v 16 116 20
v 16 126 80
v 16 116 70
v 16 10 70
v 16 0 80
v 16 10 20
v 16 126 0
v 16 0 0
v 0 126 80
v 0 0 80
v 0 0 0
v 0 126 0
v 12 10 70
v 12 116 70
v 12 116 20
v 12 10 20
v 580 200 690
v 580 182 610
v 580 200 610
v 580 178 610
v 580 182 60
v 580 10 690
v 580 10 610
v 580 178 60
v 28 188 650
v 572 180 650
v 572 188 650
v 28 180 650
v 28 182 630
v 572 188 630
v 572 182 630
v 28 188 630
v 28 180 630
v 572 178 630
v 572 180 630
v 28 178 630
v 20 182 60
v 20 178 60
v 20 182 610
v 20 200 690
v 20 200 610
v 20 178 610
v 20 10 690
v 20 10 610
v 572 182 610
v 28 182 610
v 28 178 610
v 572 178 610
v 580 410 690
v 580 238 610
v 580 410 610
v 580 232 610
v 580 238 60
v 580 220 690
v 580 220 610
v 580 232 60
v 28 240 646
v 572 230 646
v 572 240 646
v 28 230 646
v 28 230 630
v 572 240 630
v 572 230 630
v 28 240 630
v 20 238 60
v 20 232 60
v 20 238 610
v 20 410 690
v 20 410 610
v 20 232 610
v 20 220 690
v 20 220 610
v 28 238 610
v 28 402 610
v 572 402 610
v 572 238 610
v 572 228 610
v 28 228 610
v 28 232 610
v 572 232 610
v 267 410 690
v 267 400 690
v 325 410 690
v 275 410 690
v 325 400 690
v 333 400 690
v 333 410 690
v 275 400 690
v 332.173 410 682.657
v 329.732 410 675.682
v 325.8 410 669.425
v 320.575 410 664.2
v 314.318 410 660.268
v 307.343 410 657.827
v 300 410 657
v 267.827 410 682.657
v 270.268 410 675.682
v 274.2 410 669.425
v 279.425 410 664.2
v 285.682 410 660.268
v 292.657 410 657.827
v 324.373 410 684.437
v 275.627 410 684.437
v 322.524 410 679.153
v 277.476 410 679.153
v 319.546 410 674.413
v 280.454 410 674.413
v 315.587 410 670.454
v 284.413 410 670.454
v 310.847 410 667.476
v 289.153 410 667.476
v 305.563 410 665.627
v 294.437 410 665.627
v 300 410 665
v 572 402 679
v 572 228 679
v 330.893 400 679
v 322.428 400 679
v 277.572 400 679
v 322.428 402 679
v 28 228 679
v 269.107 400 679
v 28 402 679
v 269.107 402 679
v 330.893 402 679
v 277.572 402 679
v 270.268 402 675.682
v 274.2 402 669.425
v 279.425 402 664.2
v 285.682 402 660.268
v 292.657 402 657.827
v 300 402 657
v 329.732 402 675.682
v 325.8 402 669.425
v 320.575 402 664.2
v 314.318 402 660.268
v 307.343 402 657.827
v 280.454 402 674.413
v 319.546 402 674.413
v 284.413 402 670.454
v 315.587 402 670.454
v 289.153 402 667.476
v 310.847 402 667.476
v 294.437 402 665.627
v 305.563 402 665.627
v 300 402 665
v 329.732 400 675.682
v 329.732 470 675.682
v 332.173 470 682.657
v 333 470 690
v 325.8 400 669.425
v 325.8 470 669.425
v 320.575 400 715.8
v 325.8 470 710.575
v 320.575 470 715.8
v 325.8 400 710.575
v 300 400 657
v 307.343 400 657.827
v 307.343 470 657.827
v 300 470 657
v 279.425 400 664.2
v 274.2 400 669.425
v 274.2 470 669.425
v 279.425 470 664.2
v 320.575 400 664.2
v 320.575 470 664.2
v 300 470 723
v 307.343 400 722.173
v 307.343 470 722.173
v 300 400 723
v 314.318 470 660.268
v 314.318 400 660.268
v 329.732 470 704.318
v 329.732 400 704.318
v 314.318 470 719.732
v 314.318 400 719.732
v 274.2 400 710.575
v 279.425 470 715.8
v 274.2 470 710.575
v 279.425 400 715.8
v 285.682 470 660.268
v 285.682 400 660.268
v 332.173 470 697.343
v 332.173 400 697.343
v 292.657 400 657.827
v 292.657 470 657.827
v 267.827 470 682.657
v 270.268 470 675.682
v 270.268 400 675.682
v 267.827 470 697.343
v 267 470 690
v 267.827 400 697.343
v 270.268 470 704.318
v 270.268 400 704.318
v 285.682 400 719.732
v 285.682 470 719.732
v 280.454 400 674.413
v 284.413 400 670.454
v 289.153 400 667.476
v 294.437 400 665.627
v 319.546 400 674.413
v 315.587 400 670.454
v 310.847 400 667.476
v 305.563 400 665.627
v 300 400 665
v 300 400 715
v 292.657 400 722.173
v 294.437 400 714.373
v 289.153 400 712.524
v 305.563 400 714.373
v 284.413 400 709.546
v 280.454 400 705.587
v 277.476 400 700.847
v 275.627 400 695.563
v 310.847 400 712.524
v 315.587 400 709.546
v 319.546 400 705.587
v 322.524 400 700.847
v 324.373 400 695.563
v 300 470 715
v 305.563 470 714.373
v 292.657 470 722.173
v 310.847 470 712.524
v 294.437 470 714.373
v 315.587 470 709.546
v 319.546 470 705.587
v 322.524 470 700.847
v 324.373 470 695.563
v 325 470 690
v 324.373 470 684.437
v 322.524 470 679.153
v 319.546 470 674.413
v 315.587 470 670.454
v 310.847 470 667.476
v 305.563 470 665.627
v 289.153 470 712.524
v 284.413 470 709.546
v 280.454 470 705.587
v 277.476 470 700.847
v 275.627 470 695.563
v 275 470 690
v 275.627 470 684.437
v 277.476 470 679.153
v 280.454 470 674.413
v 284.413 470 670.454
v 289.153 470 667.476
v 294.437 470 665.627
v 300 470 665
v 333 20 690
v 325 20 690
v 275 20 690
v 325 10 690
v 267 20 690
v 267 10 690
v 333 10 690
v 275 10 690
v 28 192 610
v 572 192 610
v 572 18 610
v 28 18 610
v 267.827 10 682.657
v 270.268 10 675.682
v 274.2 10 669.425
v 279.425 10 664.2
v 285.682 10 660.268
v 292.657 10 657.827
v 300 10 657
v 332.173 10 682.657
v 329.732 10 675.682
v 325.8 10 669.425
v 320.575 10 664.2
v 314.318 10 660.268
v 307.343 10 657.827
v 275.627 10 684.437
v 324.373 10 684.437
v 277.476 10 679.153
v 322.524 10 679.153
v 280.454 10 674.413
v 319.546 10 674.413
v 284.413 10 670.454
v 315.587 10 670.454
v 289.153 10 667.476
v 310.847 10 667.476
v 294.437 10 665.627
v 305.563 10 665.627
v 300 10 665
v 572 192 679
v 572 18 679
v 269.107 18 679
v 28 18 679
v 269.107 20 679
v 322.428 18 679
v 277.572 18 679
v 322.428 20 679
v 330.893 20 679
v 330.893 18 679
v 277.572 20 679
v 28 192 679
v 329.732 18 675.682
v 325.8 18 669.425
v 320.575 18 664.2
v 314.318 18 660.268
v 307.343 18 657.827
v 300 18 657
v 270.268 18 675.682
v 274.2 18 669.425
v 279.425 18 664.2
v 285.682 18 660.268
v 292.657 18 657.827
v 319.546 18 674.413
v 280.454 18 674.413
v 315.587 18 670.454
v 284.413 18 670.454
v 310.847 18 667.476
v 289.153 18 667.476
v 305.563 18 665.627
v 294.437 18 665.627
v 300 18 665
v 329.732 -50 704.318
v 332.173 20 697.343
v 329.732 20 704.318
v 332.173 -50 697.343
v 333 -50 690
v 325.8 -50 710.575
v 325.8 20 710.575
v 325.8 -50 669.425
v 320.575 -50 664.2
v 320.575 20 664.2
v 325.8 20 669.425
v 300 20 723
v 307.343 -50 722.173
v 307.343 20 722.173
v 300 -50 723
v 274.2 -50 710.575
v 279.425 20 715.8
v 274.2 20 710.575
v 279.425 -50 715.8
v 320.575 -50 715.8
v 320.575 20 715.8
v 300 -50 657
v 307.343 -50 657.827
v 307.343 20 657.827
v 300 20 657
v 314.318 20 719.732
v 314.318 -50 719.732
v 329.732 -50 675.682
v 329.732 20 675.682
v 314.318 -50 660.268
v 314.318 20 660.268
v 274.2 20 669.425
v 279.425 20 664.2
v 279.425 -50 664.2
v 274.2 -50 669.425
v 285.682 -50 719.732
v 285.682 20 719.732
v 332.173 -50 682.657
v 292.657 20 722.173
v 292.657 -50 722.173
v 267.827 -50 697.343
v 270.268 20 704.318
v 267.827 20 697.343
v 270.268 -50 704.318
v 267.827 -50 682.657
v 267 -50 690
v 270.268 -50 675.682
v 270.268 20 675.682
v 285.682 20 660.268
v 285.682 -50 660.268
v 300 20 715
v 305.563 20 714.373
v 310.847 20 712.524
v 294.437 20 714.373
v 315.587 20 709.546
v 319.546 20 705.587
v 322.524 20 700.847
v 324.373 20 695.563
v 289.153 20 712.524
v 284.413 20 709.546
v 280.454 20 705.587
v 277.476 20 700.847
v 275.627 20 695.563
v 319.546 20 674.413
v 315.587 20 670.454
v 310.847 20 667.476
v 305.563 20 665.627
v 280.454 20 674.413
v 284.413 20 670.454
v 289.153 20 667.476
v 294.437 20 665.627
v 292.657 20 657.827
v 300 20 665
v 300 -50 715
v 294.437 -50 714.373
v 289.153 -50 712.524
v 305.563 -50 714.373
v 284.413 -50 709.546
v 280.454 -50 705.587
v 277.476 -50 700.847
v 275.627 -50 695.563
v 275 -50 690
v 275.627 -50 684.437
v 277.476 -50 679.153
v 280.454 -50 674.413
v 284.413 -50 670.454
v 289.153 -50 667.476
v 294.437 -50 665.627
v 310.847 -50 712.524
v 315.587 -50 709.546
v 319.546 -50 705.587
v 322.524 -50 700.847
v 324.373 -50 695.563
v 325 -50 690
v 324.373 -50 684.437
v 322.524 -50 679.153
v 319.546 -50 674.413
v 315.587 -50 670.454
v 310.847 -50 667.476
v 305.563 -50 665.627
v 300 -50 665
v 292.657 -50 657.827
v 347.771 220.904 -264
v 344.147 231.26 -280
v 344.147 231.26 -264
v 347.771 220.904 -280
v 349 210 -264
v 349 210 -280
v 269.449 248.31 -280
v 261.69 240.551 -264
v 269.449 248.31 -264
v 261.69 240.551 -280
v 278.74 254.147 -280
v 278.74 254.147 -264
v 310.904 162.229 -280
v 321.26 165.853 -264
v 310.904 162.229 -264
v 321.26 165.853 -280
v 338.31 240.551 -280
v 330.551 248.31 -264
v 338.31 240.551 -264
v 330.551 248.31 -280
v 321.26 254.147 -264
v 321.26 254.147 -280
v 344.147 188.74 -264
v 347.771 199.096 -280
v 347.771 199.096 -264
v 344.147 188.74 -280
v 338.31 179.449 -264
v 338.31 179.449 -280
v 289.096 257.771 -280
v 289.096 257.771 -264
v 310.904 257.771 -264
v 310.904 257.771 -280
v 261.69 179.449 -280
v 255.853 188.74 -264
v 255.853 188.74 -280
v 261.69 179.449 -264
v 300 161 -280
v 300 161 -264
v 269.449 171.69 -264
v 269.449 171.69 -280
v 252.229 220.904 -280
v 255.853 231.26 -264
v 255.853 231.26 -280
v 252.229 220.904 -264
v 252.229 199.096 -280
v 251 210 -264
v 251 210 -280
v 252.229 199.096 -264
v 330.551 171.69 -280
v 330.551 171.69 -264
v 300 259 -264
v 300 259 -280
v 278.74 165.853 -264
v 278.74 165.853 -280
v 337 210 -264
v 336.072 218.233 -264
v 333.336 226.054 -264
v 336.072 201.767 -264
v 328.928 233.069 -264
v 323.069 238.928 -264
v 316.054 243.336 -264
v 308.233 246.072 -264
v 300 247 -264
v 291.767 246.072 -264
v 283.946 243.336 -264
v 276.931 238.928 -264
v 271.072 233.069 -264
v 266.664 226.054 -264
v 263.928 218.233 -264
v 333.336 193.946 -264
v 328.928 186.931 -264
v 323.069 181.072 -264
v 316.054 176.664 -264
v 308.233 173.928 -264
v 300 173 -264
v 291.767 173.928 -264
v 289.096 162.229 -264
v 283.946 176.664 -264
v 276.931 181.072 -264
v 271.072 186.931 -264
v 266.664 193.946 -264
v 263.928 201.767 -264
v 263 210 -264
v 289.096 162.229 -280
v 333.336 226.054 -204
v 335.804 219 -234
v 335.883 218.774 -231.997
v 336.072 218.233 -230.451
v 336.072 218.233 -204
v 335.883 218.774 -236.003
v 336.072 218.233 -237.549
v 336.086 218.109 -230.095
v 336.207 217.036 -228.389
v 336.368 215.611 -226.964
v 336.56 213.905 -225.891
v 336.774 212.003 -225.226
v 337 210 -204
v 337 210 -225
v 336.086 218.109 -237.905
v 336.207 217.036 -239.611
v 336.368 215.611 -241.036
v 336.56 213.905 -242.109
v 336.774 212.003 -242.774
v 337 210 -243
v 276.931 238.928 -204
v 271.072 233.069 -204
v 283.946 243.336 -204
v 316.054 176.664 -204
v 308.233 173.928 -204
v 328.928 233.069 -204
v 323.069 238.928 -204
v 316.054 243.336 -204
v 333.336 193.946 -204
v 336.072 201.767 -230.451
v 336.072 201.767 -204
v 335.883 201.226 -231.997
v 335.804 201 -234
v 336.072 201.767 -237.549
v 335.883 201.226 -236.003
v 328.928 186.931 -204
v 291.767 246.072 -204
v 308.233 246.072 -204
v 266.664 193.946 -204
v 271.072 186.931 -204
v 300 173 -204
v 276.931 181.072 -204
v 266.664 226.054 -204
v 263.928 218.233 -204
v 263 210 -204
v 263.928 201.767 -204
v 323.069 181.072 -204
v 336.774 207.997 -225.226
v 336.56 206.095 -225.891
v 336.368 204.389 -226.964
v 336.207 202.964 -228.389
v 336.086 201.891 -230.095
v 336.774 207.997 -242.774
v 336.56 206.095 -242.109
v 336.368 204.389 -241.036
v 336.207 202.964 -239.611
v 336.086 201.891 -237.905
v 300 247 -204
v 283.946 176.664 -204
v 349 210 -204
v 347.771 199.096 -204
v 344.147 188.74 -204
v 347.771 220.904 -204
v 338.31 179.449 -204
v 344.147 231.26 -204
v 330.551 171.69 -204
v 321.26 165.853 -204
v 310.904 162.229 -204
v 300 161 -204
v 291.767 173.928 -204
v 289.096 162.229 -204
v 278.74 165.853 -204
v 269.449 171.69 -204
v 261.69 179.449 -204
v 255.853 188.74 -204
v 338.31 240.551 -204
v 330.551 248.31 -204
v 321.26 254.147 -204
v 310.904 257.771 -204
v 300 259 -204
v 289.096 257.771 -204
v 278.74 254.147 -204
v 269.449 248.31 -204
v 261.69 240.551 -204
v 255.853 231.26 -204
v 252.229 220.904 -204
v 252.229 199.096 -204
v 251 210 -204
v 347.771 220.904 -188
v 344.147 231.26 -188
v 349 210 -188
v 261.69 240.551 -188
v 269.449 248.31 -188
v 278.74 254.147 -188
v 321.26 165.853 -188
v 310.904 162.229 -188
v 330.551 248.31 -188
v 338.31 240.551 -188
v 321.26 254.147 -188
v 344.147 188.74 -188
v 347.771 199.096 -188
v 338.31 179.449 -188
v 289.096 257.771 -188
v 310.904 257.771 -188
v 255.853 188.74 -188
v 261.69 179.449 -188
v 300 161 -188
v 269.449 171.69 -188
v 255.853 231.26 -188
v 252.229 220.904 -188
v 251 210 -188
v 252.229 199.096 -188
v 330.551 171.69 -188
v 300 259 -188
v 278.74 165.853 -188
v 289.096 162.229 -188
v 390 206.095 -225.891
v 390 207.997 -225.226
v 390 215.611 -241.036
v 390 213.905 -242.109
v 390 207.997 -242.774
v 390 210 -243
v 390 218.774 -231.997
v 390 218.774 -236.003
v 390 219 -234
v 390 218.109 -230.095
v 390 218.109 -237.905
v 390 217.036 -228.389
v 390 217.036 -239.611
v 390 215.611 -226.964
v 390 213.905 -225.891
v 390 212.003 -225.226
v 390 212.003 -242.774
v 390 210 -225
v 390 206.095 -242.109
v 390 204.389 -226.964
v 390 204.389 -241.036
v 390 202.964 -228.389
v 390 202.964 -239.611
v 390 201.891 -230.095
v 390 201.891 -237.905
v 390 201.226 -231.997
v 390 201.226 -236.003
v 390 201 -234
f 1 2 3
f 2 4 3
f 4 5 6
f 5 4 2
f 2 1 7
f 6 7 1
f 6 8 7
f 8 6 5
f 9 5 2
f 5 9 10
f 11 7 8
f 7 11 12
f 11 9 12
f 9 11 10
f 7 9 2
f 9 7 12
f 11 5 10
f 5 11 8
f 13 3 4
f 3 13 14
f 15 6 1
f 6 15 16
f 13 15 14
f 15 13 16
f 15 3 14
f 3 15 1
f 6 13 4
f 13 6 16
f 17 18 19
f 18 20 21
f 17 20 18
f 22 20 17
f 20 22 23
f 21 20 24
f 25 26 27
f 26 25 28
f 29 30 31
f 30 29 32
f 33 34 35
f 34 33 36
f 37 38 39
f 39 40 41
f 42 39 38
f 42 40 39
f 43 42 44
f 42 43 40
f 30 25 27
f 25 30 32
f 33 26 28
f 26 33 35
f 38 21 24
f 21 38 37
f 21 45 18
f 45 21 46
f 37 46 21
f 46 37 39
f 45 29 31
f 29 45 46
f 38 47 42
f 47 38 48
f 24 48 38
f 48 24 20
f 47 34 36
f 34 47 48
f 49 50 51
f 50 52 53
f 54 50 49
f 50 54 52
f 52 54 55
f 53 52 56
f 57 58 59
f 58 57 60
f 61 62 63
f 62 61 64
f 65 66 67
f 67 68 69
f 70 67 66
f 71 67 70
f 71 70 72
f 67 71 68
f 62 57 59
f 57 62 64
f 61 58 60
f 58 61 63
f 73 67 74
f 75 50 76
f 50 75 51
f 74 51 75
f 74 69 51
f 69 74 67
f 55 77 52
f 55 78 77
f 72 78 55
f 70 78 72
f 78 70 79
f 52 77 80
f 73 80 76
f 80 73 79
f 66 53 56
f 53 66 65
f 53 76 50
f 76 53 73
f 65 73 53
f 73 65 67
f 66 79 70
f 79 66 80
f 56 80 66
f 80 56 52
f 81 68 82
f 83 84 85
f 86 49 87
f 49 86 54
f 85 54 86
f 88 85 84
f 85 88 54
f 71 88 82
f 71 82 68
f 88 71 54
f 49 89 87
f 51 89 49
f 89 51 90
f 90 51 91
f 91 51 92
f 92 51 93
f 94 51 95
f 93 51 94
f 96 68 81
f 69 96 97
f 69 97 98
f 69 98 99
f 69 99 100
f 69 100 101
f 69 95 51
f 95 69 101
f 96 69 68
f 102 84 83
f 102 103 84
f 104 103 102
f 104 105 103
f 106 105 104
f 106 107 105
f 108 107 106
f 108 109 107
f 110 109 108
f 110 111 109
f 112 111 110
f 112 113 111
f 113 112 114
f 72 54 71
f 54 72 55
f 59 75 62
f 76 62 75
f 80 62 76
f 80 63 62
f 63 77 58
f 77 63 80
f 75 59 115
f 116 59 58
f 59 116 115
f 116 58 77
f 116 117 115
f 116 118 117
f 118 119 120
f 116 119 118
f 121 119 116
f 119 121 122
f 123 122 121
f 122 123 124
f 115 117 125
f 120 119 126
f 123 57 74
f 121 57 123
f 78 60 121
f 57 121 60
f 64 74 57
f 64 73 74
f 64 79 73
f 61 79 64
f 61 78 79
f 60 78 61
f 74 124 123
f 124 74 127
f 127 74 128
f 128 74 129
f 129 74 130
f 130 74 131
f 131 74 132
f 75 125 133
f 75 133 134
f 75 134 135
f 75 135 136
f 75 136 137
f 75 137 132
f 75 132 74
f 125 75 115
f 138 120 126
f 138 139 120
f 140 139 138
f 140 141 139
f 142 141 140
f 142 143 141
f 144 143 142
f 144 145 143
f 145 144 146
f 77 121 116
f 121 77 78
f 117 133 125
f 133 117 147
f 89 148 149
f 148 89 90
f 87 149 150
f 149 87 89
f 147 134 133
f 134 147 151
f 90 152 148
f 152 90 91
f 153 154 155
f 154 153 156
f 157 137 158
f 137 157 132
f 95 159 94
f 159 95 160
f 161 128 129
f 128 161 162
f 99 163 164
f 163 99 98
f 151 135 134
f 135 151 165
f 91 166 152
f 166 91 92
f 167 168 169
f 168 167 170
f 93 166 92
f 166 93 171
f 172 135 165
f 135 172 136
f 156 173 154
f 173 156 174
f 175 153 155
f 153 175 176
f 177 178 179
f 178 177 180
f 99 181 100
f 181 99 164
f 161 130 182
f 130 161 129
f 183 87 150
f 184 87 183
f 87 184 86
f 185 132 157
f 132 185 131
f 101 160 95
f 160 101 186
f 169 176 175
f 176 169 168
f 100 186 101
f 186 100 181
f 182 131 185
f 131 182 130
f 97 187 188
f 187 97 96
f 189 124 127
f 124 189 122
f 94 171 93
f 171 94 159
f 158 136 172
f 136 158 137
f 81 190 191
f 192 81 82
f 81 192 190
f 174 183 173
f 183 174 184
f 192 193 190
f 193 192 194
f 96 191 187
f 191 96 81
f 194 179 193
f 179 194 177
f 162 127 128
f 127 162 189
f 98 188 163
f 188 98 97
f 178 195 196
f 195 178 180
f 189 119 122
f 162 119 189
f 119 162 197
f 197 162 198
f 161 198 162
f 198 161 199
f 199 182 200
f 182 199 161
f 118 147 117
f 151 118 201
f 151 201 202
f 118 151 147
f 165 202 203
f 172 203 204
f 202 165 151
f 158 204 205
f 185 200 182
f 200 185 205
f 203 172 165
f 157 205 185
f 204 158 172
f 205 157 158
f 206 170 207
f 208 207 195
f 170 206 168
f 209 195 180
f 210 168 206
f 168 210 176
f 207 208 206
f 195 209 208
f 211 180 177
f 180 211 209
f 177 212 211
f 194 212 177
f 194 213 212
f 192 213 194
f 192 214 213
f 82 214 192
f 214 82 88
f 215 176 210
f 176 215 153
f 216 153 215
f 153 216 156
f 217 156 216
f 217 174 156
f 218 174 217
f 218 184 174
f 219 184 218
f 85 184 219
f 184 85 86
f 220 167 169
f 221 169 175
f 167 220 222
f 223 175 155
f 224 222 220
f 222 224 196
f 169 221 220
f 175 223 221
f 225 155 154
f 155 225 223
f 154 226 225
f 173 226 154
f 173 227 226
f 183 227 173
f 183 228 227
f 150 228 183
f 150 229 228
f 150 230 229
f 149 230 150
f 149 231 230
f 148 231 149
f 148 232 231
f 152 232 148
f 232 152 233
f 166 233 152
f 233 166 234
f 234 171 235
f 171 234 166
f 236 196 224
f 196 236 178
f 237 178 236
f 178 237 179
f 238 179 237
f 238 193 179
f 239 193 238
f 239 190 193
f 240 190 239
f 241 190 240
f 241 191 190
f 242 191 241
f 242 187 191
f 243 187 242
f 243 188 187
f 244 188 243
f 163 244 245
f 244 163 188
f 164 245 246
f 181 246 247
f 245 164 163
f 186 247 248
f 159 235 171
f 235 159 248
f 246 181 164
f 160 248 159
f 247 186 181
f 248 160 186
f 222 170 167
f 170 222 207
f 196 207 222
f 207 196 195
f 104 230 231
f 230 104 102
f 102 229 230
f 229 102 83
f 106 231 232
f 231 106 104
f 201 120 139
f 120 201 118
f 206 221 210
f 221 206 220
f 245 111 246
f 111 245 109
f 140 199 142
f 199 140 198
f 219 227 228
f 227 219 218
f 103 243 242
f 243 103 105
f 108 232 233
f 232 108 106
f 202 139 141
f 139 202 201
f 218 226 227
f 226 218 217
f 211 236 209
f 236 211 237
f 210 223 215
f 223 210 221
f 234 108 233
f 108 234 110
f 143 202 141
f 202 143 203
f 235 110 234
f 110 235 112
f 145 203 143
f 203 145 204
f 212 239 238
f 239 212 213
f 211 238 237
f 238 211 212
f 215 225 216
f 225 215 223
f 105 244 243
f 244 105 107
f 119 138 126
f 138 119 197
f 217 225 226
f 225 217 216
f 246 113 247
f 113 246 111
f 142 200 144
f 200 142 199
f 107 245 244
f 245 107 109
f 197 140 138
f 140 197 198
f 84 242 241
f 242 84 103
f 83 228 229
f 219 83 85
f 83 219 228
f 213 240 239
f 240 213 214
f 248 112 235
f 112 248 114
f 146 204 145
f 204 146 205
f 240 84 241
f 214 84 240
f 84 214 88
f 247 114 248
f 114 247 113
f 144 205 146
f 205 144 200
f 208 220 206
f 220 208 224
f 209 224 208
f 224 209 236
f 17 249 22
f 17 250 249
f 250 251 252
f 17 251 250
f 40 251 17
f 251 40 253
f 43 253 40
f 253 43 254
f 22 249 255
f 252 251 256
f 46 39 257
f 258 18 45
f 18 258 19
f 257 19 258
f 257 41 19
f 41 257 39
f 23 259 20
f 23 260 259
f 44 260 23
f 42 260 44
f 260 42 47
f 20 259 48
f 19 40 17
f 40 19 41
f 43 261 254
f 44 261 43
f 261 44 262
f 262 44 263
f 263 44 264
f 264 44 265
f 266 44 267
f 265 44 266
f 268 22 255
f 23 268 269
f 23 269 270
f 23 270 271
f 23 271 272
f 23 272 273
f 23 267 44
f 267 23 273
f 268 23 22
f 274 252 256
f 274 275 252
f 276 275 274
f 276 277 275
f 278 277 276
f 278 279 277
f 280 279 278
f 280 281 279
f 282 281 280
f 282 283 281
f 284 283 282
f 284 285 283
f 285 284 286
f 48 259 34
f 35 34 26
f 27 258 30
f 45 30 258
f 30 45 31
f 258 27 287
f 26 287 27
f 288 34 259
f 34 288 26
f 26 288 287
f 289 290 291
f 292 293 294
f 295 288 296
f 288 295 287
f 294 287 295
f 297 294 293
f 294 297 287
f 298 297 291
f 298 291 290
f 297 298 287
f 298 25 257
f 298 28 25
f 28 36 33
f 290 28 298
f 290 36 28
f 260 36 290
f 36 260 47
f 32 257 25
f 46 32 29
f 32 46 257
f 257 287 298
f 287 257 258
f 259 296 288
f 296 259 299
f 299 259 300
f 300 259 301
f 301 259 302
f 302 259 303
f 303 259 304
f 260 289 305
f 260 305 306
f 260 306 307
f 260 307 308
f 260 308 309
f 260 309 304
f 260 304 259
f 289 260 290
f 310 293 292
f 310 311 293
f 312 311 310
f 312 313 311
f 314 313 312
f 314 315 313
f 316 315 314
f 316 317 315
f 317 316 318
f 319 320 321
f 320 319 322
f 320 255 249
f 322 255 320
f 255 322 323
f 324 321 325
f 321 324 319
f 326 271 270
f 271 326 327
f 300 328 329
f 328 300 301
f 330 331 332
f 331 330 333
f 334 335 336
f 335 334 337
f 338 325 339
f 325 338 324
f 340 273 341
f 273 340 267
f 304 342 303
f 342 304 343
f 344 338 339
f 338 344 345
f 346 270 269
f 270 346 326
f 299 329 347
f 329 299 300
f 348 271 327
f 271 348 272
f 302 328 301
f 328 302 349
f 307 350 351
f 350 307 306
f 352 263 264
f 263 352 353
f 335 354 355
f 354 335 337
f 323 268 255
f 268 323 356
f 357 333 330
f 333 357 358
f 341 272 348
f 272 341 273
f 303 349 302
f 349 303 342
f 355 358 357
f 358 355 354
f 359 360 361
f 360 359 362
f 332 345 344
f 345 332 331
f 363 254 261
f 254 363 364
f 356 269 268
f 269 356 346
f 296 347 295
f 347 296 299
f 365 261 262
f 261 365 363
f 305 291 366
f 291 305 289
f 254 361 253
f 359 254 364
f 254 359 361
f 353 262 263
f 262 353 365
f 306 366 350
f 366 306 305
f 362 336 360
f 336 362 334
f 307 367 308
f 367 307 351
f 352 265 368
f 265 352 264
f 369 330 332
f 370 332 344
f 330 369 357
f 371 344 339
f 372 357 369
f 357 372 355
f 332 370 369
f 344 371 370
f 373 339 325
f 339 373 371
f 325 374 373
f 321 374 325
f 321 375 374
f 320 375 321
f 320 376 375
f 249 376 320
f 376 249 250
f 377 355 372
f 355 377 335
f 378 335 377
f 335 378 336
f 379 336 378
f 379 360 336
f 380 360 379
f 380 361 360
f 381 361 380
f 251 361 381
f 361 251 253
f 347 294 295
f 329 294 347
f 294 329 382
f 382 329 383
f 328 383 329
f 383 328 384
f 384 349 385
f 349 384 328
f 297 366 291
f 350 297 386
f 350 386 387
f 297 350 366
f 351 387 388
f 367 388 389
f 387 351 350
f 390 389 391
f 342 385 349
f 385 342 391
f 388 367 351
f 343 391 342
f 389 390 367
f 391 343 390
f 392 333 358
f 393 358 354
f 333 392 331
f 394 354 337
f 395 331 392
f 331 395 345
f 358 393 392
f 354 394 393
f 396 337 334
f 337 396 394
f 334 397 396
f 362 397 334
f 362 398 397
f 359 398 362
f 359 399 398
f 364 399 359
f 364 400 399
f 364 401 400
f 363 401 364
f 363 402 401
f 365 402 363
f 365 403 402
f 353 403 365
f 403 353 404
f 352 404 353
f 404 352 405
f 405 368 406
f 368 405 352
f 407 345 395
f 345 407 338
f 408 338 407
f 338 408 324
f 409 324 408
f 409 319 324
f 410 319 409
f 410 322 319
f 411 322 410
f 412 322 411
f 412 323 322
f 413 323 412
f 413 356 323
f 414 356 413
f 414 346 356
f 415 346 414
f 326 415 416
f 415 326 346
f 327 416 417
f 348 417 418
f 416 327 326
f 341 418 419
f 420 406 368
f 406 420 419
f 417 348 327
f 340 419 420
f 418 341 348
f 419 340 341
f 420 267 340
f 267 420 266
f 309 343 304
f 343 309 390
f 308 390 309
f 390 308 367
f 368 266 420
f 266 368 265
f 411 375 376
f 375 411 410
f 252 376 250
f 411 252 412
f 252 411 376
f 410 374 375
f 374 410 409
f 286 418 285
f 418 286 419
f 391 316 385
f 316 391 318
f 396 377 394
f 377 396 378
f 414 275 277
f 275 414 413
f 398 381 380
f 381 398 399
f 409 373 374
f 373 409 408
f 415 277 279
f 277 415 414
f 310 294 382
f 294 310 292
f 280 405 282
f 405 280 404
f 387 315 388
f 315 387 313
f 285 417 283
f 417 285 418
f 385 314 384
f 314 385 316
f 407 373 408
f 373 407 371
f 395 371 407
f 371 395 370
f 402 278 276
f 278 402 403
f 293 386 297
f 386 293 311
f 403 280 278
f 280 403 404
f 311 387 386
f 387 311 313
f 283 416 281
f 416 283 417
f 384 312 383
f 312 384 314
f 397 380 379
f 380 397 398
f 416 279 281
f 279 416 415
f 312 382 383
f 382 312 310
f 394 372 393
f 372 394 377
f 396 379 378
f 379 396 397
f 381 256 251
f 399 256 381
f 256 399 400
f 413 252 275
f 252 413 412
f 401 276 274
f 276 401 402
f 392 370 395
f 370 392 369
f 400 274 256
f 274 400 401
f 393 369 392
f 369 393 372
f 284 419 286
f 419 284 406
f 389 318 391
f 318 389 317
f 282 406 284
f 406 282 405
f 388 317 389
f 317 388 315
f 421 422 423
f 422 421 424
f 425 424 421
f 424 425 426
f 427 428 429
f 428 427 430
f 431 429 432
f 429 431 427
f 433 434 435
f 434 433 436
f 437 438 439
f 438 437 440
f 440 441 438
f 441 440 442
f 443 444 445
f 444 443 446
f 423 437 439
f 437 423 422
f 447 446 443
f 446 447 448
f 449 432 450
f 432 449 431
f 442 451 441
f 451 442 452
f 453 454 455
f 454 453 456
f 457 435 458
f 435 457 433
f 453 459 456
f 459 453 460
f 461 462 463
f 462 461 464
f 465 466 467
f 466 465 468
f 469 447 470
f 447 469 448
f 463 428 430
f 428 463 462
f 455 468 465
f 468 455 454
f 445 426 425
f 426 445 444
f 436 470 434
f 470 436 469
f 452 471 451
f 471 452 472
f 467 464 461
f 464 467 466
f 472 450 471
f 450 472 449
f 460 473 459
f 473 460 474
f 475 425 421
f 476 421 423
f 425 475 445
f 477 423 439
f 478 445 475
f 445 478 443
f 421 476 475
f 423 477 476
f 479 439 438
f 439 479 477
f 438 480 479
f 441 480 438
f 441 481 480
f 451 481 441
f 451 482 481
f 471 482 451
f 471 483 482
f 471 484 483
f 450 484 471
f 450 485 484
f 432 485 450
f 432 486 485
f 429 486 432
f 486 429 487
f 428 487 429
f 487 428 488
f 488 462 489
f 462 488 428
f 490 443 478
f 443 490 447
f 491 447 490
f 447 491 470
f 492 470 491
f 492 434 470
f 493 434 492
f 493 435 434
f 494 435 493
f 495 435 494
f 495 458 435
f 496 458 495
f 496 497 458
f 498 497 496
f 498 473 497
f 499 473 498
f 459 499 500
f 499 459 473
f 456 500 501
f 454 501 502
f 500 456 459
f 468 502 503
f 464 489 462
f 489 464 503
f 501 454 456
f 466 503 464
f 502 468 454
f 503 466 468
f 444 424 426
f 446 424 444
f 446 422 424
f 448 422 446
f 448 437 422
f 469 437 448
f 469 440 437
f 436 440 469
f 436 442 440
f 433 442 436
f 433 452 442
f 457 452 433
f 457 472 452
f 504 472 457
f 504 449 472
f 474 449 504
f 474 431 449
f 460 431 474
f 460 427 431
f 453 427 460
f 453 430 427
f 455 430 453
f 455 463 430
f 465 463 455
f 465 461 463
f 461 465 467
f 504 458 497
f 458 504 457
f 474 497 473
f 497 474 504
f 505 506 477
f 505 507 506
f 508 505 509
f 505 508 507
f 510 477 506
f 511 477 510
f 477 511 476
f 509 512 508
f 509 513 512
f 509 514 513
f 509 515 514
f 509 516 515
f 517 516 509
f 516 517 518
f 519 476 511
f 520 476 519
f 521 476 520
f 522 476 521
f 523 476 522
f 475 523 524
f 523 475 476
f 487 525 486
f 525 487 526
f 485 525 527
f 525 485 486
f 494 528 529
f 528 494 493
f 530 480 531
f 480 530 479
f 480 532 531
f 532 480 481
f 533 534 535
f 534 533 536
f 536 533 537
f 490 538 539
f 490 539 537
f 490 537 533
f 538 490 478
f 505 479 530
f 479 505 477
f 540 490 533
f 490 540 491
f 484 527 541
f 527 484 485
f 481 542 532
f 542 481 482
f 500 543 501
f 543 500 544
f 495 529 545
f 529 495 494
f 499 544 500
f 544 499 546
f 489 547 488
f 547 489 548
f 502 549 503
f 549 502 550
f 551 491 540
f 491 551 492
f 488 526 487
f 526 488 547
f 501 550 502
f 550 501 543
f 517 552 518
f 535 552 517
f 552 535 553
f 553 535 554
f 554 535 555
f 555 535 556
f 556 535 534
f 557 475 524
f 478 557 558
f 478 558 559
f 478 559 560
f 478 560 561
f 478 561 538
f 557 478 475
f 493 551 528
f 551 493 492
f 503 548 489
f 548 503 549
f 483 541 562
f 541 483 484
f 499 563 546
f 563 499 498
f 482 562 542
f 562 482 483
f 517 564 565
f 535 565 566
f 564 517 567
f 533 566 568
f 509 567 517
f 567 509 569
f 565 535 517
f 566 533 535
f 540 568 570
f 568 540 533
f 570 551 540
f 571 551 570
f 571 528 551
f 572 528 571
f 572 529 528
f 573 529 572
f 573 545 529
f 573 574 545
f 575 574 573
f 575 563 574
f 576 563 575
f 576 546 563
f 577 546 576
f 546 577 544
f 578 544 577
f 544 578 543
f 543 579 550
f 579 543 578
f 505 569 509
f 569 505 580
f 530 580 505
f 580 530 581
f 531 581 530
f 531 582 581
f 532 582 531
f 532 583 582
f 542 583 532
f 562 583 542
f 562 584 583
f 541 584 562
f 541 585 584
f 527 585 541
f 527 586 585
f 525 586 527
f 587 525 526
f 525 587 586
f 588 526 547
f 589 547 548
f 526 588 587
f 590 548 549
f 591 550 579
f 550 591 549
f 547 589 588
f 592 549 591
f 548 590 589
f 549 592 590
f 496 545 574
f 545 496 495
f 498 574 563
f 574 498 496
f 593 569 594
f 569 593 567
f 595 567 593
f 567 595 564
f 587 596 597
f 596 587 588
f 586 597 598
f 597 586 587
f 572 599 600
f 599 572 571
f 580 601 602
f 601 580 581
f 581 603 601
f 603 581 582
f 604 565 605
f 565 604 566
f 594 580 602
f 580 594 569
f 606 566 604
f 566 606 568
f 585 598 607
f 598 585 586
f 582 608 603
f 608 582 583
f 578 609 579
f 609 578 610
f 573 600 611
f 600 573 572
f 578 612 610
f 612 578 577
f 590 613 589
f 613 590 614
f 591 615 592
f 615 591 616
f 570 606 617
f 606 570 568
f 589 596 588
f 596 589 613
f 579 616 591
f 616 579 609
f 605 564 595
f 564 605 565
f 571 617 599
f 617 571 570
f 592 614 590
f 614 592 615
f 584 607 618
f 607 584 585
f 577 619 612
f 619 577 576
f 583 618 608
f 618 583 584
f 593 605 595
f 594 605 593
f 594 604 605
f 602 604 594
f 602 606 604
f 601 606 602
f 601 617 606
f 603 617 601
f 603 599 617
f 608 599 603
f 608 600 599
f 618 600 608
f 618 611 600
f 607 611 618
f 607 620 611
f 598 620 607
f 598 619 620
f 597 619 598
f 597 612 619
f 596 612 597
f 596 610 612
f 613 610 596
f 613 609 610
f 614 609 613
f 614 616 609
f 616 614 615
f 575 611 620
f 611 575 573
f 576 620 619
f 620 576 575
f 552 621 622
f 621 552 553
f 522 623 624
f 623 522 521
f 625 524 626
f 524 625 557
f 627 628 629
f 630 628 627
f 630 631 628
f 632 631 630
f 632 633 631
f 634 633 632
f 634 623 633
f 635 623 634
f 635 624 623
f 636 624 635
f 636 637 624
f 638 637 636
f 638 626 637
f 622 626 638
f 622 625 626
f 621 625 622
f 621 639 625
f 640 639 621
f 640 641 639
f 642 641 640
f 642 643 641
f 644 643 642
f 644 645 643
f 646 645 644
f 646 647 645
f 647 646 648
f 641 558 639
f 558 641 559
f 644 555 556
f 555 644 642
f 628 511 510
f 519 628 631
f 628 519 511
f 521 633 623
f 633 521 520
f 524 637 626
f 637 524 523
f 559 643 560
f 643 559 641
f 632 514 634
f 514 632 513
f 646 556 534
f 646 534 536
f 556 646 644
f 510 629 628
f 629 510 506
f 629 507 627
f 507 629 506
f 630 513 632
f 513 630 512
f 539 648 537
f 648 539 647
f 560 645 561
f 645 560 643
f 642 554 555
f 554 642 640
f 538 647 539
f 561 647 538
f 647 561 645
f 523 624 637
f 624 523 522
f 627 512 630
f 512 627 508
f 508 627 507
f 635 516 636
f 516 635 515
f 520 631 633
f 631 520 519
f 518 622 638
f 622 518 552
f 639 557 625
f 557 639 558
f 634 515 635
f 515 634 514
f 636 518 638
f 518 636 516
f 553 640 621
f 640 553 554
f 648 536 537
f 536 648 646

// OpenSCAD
// file: ../params.scad
// Shared millimetre parameters. Keep in lockstep with freecad/params.py.
// Module scale: 150 kg/day wet train. Walls are CPVC sheet, not metal.

$fn = 36;

WALL        = 12;     // CPVC sheet thickness
FLOOR       = 16;     // floor plate (trough sits on this)

// LEACH CSTR 1 — inside liquor box
CSTR_L      = 2000;
CSTR_W      = 1200;
CSTR_H      = 1400;   // liquid + freeboard
FREEBOARD   = 200;

// CSTR 2 weir (same vessel, +X wall)
WEIR_W      = 450;
WEIR_CREST  = CSTR_H - FREEBOARD;   // from inner floor
WEIR_SLOT_H = 80;
WEIR_LIP    = 120;    // external spout projection

// CSTR 3 floor auger — injection-molded PVC / FG
AUGER_D     = 140;    // flight OD
AUGER_SHAFT = 40;
AUGER_PITCH = 110;
AUGER_TROUGH_W = 180;
AUGER_TROUGH_H = 110;
AUGER_OFFSET_Y = 280; // trough centreline from inner -Y wall
AUGER_INCLINE  = 28;  // deg, lifts out of liquor toward +X

// mixer / nozzles (lid)
MIXER_D     = 50;
GAS_D       = 80;     // acid-gas takeoff
DROP_X      = 80;     // inner-X of shred drop slot
DROP_L      = 400;
DROP_W      = 250;
DROP_COAM   = 80;     // raised coaming around the slot

// LEACHATE PUMP / coarse strainer — −X wall, opposite the weir
PUMP_D      = 80;     // DN80
PUMP_Z      = 450;    // centreline above inner floor (submerged)
PUMP_Y      = 900;    // centreline from inner −Y (away from auger)
STRAINER_L  = 180;
STRAINER_W  = 140;
STRAINER_H  = 160;

// mezzanine feed train
MEZZ_H      = 2200;   // platform top above tank outer floor
MEZZ_L      = 1600;   // platform length in −X
MEZZ_THK    = 12;
HOPPER_L    = 700;
HOPPER_W    = 600;
HOPPER_H    = 800;
SHRED_L     = 500;
SHRED_W     = 500;
SHRED_H     = 450;
CONV_W      = 240;
CONV_H      = 120;
CONV_PLATE  = 6;      // trough plate
CONV_FLANGE = 40;
CONV_SPRING_D = 50;
CONV_SPRING_H = 80;
CONV_BOLT   = 10;     // M10 clearance
CONV_LEN    = 1800;   // default standalone length; plant instance is computed
DUST_D      = 150;    // dust-hood outlet to DUST header
AUGER_LIFT_L = 700;

// dewater belts + split (Phase A 4–6)
FDEW_L      = 1800;
FDEW_W      = 450;
FDEW_H      = 80;
FDEW_RISE   = 120;    // solids end higher so liquor runs back to weir
SDEW_L      = 1400;
SDEW_W      = 220;
SDEW_H      = 80;
SPLIT_L     = 600;
SPLIT_W     = 500;
SPLIT_H     = 400;
STUB_L      = 400;
STUB_W      = 300;
STUB_H      = 250;

// EW funnel cell
EW_L        = 600;    // along aisle (overflow direction)
EW_W        = 420;    // anode-cathode depth
EW_H        = 650;    // rectangular body
EW_FUNNEL_H = 220;
EW_VALVE_D  = 50;
EW_VALVE_L  = 60;
EW_MEM_T    = 4;      // CEM
EW_SLOT     = 10;     // membrane cassette slot
EW_PITCH    = 750;    // aisle spacing, centre to centre
AISLE_X0    = 200;
AISLE_Y     = -(EW_W + 2*WALL) - 400;
AISLE_Z     = 400;
BUND_H      = 150;
BUND_PAD    = 250;
SUMP_L      = 400;
SUMP_W      = 400;
SUMP_H      = 300;
VDF_D       = 700;
VDF_L       = 900;
PAIL_W      = 180;
HDR_D       = 80;
HDR_Z       = 1400;
PYRO_D      = 320;
PYRO_L      = 2800;

// Campus envelopes — lockstep with freecad/params.py
FARM_X=12000; FARM_Y=8000; FARM_L=12000; FARM_W=8000; FARM_H=4500;
FAB_X=12000;  FAB_Y=-6000; FAB_L=8000;   FAB_W=6000;  FAB_H=4000;
HAB_X=-8000;  HAB_Y=8000;  HAB_L=8000;   HAB_W=6000;  HAB_H=3200;
CRYO_X=-6000; CRYO_Y=-4000; CRYO_L=4000; CRYO_W=3000; CRYO_H=3000;
MFG_X=2000;   MFG_Y=9000;  MFG_L=6000;   MFG_W=4000;  MFG_H=3500;

LIFE_Z_GREY=900; LIFE_Z_UPW=1100; LIFE_Z_ETCH=1300;
LIFE_Z_O2=2800; LIFE_Z_N2=3000; LIFE_Z_CO2=3200;
LIFE_D_GREY=50; LIFE_D_UPW=40; LIFE_D_ETCH=32;
LIFE_D_GAS=25; LIFE_D_CO2=40;
// main file
// One EW cell fit-out: CEM slot, hangers, anode hood, cathode hood, harvest valve.
// Valve SKU: GF 546 Pro V 163 546 357V (DN50 PVC-C FKM vented ASTM).
// Alt: Spears TU 2000 2 in CPVC FKM vented.
// Anode hood → HDR_ACID_GAS. Cathode hood → HDR_H2. Do not common the two.
include <../params.scad>;
$fn = 28;

module overflow_weir() {
    difference() {
        cube([WALL + 4, EW_W * 0.30, 80]);
        translate([WALL, 10, 20]) cube([8, EW_W * 0.30 - 20, 50]);
    }
}

module cathode_hanger() {
    cube([EW_L - 40, 8, 20]);
    translate([0, -2, -EW_H + 80]) cube([EW_L - 40, 4, EW_H - 80]);
}

module anode_hanger() {
    cube([EW_L - 40, 10, 16]);
    translate([0, 2, -EW_H + 80]) cube([EW_L - 40, 6, EW_H - 100]);
}

module anode_hood() {
    // +Y half of cell, suction DN50
    difference() {
        translate([20, EW_W/2 + 10, EW_H - 40])
            cube([EW_L - 40, EW_W/2 - 20, 80]);
        translate([28, EW_W/2 + 18, EW_H - 41])
            cube([EW_L - 56, EW_W/2 - 36, 70]);
    }
    translate([EW_L/2, EW_W - 20, EW_H + 40])
        rotate([-90, 0, 0])
            difference() {
                cylinder(h=70, d=66);
                translate([0, 0, -1]) cylinder(h=72, d=50);
            }
}

module cathode_hood() {
    difference() {
        translate([20, 10, EW_H - 40])
            cube([EW_L - 40, EW_W/2 - 20, 80]);
        translate([28, 18, EW_H - 41])
            cube([EW_L - 56, EW_W/2 - 36, 70]);
    }
    translate([EW_L/2, 20, EW_H + 40])
        rotate([90, 0, 0])
            difference() {
                cylinder(h=70, d=66);
                translate([0, 0, -1]) cylinder(h=72, d=50);
            }
}

module harvest_valve_546() {
    // GF Type 546 envelope, DN50
    union() {
        cylinder(h=16, d=98);
        translate([0, 0, 16]) cylinder(h=EW_VALVE_L, d=EW_VALVE_D + 2*WALL);
        translate([0, 0, 16 + EW_VALVE_L]) cylinder(h=16, d=98);
        translate([0, 0, 16 + EW_VALVE_L/2])
            rotate([0, 90, 0]) cylinder(h=90, d=18);
    }
}

module mfg_ew_fitout() {
    overflow_weir();
    translate([20, EW_W/2 - EW_SLOT - 20, EW_H - 20]) cathode_hanger();
    translate([20, EW_W/2 + 20, EW_H - 20]) anode_hanger();
    anode_hood();
    cathode_hood();
    translate([EW_L/2, EW_W/2, -EW_FUNNEL_H - EW_VALVE_L])
        harvest_valve_546();
}

mfg_ew_fitout();
